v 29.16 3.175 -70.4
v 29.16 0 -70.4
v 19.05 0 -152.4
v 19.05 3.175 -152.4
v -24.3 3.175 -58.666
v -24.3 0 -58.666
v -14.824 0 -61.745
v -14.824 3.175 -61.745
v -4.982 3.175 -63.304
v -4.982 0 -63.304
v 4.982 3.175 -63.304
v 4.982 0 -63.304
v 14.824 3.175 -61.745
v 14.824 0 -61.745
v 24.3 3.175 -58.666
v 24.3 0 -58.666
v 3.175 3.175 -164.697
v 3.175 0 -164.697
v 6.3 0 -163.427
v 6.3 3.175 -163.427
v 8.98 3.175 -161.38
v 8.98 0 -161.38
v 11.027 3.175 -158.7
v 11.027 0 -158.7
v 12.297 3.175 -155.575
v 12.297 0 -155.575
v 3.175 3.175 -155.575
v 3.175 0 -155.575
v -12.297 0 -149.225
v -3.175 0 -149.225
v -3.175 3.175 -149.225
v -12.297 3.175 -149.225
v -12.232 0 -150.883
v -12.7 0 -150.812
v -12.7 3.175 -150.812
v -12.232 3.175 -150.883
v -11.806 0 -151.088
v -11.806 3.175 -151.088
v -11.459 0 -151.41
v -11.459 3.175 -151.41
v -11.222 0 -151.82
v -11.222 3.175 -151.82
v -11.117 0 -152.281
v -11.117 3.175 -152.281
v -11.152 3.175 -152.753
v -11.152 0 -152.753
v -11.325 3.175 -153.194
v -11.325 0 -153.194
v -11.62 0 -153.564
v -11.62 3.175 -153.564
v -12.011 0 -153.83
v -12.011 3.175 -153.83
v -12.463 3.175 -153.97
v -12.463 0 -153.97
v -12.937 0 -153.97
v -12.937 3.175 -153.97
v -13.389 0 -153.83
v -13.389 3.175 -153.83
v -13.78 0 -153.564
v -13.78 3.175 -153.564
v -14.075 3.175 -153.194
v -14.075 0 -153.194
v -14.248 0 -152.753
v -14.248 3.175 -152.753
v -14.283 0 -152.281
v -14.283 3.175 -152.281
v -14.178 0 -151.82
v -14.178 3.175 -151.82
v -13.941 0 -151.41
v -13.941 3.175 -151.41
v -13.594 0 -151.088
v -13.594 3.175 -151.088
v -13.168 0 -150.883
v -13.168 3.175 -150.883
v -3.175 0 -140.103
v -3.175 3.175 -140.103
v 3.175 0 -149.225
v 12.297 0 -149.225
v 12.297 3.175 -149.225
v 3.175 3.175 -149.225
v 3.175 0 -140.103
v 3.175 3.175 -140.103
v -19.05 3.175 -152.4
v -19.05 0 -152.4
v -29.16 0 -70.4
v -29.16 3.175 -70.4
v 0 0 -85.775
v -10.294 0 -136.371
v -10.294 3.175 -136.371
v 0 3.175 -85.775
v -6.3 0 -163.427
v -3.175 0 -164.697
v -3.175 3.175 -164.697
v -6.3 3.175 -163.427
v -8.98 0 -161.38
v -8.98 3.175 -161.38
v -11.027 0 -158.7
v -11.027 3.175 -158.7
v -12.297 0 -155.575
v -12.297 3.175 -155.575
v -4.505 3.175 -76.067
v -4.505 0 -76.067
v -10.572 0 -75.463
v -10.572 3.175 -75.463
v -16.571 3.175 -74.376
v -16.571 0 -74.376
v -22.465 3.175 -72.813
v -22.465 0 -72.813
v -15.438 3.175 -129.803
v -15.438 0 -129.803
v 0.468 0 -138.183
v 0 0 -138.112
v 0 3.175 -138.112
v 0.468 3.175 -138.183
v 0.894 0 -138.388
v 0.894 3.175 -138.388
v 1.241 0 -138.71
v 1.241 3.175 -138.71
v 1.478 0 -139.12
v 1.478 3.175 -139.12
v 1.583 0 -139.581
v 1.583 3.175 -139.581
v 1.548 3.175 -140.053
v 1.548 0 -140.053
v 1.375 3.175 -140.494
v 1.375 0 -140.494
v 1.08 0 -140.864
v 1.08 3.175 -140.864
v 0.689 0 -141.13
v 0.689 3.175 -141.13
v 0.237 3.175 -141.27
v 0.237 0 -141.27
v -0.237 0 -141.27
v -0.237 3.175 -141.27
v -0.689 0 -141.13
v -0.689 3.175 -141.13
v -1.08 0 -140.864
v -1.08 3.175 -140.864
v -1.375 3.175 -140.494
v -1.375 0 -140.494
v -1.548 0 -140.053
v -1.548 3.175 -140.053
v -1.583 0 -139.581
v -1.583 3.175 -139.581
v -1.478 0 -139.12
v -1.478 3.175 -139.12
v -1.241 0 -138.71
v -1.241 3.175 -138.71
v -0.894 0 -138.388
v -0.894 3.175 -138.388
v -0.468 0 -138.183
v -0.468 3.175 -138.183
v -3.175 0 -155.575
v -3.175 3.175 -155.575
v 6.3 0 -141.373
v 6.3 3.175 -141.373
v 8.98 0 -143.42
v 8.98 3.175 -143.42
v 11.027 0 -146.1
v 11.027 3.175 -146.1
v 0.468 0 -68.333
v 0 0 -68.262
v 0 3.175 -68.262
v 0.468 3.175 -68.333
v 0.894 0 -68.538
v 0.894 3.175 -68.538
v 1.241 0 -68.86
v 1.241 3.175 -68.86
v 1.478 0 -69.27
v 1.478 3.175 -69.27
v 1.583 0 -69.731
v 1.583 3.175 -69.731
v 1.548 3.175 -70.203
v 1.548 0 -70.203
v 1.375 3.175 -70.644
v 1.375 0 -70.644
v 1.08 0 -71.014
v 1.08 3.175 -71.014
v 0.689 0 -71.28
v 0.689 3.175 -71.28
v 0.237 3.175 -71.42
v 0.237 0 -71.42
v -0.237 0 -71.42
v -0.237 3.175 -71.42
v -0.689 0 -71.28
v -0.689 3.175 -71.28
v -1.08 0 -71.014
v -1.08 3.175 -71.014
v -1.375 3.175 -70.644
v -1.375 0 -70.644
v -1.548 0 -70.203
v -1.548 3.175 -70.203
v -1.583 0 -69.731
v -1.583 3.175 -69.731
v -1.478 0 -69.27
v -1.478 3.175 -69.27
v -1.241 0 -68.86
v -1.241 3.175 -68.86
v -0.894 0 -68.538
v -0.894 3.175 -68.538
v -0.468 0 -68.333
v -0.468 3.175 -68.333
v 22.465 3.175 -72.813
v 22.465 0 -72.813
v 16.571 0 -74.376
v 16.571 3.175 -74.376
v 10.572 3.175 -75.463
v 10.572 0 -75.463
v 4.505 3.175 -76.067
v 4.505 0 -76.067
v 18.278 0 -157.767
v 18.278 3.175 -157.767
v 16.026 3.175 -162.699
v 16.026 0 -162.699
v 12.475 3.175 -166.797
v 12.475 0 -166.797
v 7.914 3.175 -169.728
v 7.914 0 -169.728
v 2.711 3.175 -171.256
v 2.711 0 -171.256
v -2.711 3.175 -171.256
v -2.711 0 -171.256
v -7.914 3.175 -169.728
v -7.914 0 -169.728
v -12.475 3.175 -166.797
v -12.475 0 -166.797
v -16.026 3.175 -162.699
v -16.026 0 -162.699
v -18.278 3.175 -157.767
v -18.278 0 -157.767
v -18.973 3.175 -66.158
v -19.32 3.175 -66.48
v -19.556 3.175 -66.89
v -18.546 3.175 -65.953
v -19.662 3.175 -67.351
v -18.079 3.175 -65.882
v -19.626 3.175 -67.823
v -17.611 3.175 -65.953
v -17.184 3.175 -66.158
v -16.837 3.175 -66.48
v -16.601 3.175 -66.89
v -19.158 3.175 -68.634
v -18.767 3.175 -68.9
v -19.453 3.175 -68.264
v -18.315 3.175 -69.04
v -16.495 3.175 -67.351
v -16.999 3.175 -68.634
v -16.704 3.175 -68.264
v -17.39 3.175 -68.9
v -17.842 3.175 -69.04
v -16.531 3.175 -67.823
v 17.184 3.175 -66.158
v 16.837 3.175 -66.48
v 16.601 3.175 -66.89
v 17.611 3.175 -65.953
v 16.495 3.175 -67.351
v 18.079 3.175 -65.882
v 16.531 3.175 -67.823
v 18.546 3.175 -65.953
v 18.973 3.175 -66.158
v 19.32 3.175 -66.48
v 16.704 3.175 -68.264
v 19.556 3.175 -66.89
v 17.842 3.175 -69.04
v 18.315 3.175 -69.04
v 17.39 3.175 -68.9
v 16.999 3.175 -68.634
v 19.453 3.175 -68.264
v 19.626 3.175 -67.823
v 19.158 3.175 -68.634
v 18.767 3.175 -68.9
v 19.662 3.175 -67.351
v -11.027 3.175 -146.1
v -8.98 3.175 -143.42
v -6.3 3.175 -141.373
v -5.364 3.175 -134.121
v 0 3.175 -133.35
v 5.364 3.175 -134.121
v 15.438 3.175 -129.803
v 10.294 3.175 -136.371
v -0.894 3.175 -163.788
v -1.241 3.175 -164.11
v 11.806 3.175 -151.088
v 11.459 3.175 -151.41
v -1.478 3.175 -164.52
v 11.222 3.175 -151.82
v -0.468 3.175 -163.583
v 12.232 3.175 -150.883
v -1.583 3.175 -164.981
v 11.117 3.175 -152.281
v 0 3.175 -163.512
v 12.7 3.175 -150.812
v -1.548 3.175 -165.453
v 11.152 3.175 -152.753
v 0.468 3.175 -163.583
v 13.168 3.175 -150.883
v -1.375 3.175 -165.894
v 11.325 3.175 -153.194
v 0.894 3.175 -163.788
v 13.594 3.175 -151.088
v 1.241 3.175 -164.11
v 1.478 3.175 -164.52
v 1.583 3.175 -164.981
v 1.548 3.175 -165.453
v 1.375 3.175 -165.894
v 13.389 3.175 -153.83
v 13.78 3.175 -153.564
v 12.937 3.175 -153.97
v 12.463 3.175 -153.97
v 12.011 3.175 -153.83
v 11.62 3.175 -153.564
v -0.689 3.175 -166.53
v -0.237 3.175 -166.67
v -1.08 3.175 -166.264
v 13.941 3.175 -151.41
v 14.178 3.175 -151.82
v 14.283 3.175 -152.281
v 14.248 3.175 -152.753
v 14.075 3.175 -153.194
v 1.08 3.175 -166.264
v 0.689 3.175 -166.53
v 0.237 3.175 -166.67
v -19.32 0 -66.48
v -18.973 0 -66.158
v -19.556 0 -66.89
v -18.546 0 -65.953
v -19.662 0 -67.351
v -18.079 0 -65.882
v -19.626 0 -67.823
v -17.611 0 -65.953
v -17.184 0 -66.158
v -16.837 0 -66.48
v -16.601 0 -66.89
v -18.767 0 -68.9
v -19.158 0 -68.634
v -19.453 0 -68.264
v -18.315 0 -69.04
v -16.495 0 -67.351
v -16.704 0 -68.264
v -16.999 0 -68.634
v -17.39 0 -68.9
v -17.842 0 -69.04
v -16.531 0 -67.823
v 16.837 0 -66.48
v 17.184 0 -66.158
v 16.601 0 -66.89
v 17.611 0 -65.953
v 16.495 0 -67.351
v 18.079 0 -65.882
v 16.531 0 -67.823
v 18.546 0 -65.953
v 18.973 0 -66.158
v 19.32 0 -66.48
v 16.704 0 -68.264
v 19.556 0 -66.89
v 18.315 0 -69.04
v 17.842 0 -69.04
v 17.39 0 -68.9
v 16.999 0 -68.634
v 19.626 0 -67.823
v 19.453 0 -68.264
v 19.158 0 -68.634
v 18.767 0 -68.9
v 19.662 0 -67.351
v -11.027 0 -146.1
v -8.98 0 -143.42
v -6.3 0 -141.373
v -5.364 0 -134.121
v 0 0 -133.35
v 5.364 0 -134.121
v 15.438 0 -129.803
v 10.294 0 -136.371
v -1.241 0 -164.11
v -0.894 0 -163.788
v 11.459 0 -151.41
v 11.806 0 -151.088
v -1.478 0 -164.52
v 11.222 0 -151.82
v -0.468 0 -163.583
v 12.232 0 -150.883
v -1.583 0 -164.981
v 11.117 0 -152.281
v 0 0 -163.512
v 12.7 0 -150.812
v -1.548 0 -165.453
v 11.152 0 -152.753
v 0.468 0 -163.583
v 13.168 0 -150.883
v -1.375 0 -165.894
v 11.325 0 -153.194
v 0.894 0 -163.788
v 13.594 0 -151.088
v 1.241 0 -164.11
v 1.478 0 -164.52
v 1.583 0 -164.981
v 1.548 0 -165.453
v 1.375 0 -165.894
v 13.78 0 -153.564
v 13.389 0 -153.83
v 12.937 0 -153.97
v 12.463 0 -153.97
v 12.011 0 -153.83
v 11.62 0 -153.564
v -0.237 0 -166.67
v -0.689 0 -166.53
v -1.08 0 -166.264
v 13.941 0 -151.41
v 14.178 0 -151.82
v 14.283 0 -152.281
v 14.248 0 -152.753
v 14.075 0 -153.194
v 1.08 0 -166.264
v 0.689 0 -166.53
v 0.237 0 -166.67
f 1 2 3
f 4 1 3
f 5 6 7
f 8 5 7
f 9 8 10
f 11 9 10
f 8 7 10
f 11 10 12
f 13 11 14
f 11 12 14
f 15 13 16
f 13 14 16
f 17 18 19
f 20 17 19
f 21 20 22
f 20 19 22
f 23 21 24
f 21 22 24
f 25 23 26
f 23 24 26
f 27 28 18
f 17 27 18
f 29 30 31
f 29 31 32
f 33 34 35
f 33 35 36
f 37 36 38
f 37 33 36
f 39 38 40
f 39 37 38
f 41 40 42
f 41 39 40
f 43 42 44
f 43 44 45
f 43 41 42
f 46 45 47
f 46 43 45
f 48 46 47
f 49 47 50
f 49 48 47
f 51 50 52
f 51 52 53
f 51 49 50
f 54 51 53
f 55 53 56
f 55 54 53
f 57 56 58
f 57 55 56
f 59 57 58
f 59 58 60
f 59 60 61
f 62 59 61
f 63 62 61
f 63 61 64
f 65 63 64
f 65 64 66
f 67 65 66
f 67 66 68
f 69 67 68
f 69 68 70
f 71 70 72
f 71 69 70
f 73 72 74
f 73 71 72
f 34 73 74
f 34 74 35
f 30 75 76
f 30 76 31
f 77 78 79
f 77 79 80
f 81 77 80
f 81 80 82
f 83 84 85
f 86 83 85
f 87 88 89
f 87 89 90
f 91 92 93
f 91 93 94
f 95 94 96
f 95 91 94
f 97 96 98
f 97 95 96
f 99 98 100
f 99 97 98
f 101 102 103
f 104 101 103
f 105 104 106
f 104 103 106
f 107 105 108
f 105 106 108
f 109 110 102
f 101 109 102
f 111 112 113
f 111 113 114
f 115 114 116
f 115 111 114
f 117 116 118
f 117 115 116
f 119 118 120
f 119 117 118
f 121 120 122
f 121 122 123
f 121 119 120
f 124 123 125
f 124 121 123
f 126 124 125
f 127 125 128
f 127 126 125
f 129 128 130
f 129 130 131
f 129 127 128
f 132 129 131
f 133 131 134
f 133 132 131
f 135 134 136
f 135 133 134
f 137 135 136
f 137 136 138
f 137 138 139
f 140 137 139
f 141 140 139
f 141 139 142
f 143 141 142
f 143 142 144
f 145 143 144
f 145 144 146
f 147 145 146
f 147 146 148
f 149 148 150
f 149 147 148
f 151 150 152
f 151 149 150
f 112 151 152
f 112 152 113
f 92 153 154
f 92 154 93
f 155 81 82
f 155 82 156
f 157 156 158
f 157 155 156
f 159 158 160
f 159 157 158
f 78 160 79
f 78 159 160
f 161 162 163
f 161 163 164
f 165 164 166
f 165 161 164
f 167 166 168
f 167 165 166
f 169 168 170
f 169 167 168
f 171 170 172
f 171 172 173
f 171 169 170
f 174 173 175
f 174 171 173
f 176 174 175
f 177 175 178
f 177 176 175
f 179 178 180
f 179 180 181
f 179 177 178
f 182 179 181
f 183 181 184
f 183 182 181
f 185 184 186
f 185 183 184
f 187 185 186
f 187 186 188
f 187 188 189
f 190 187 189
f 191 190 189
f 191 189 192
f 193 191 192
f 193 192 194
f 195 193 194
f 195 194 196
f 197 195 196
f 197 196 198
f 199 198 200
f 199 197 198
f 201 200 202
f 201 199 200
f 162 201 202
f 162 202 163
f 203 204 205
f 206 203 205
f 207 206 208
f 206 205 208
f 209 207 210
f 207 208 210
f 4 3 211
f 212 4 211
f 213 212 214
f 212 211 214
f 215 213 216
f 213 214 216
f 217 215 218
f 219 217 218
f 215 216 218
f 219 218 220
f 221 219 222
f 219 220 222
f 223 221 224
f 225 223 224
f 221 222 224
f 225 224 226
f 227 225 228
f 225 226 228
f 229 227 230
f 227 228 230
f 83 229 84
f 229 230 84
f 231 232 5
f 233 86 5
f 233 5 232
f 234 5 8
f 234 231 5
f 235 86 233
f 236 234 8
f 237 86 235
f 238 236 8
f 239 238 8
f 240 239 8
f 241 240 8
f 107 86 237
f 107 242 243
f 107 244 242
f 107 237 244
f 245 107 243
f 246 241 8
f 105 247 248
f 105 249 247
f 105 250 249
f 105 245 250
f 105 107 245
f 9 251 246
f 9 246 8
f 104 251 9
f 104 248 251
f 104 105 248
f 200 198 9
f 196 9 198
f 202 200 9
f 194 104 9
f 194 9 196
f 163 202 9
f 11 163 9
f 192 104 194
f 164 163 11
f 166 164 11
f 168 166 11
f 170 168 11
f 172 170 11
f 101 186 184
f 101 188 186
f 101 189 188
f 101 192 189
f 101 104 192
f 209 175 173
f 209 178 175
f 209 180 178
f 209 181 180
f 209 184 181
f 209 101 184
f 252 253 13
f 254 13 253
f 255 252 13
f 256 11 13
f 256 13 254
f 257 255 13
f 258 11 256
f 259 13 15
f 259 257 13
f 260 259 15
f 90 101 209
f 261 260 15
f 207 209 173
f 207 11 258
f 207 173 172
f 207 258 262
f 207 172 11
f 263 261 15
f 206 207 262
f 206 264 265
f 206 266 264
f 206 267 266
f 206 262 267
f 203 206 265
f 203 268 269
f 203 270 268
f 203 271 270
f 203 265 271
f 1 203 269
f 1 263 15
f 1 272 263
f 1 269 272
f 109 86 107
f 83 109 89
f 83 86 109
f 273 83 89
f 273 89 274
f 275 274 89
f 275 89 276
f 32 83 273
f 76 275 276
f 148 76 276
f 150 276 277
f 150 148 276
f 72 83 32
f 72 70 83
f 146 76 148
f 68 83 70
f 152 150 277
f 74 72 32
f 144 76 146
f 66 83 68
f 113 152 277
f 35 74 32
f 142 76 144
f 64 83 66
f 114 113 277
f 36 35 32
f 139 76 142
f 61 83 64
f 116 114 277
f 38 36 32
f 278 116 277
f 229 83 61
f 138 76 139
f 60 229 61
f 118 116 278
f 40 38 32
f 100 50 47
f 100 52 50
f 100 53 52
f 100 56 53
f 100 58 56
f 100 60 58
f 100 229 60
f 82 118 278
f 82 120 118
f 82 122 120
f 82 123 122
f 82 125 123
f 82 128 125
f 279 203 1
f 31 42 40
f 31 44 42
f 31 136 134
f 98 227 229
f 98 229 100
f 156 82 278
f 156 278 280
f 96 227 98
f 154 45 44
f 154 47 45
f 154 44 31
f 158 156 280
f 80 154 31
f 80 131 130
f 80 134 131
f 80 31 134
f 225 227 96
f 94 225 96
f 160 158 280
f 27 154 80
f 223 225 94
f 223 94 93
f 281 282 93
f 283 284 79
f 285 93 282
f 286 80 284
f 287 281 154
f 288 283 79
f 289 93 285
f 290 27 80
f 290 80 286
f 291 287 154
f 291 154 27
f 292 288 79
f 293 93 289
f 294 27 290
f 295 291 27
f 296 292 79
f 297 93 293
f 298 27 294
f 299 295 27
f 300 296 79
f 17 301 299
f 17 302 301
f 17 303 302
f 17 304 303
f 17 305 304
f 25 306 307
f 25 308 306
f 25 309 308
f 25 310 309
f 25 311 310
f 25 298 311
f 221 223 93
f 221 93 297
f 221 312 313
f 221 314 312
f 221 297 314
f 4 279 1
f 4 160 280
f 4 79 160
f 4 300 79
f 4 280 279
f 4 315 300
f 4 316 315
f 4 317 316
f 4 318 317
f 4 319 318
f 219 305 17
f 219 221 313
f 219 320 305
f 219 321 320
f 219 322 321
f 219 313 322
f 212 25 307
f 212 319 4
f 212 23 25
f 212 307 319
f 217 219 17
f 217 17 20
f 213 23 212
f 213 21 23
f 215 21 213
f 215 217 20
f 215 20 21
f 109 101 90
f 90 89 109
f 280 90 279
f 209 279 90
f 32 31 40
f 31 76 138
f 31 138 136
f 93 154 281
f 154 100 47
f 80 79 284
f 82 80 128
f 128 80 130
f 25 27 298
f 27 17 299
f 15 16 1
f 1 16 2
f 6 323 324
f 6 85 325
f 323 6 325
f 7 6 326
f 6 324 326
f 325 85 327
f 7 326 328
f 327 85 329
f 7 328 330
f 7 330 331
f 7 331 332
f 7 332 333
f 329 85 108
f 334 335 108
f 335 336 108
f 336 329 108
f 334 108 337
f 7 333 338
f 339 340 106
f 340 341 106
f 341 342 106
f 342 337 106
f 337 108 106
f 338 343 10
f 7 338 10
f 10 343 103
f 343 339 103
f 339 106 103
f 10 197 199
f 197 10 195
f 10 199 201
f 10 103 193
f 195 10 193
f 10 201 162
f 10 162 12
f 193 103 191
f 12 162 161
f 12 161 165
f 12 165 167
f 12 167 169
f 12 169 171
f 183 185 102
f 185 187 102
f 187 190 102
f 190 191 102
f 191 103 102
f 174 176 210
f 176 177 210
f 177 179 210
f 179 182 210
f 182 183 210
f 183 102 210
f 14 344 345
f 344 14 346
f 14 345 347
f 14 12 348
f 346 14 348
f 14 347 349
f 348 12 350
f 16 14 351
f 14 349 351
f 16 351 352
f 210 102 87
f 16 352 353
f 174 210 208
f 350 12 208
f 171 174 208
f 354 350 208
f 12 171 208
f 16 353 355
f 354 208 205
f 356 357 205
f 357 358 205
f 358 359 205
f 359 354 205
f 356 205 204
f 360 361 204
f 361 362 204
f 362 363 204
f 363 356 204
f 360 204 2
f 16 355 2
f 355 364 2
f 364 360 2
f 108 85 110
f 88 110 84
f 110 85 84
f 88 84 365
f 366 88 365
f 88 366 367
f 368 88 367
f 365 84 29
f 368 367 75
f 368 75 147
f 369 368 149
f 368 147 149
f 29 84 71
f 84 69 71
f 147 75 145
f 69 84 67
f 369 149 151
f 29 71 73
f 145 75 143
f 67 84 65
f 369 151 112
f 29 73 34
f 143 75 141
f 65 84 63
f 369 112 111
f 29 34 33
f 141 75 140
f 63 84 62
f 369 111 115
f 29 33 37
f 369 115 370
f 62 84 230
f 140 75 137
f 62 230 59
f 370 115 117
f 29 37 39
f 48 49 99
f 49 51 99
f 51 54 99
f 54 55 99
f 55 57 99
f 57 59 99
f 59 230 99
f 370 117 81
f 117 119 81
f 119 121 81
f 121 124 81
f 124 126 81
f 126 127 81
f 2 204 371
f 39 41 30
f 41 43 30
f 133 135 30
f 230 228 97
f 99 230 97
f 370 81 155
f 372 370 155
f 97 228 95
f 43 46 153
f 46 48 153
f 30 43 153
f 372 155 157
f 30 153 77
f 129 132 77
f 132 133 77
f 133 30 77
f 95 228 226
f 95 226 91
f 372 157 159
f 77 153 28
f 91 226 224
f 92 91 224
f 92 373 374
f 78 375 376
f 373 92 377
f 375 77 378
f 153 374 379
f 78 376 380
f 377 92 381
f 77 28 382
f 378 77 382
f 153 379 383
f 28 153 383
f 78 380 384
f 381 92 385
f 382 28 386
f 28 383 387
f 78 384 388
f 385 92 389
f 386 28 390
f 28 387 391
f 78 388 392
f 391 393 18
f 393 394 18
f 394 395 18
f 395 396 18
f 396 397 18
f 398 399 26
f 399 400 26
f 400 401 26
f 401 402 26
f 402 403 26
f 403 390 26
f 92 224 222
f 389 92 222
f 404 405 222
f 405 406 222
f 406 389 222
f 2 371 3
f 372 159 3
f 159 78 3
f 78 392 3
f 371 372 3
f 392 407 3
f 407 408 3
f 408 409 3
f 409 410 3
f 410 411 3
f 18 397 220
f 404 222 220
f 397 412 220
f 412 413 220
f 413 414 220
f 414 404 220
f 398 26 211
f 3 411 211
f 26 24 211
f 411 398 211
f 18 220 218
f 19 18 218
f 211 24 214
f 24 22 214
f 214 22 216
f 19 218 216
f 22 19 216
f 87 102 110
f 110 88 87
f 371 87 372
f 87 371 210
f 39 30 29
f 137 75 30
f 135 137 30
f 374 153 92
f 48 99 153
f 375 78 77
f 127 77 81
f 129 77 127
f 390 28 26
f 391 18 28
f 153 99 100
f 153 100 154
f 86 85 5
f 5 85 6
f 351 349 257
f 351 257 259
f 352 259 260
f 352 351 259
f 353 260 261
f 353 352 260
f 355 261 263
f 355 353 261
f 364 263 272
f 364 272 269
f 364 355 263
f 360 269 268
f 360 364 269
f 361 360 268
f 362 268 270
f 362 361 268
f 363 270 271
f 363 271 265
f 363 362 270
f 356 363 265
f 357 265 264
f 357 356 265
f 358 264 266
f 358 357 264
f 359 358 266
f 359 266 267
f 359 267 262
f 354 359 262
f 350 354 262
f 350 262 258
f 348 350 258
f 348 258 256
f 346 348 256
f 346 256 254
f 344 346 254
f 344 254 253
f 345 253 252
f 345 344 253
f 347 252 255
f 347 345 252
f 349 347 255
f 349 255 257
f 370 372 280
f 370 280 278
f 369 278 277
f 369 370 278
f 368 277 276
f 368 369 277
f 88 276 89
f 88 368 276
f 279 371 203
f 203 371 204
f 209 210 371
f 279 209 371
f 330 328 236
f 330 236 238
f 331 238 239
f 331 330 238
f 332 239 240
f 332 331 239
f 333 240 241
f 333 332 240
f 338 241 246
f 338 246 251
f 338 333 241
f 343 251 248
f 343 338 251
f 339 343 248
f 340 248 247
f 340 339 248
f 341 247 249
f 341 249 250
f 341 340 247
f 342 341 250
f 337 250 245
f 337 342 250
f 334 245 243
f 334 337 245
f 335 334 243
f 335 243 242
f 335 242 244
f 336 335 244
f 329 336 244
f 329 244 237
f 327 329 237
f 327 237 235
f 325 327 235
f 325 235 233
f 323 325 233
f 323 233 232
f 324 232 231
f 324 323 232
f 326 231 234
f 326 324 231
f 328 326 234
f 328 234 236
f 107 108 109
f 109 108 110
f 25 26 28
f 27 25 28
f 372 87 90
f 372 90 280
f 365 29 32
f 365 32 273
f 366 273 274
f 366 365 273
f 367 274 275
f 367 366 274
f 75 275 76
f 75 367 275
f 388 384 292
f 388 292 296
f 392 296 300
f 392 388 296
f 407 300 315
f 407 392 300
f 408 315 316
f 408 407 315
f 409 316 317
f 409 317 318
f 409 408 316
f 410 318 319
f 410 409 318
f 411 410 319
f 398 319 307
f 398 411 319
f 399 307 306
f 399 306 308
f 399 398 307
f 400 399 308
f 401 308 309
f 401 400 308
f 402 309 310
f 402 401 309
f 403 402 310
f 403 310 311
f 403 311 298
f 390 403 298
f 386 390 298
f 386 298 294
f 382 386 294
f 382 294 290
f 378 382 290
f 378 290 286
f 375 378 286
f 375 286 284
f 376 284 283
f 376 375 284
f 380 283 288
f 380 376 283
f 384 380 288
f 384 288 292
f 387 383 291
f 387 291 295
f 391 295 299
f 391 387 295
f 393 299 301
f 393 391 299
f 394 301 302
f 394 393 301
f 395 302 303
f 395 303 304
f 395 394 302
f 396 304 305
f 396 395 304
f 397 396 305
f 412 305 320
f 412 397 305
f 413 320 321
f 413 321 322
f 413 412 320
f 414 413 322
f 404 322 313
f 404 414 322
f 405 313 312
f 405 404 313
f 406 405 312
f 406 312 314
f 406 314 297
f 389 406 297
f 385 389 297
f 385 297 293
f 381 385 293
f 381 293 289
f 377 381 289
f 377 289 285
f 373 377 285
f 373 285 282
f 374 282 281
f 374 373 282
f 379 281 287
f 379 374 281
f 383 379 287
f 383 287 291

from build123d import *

# Parameters (mm, degrees)
SKETCH1_R           = 1.5875
SKETCH1_R_2         = 1.587499999
BOSS_EXTRUDE1_DEPTH = 3.175


with BuildPart() as part:
    # Sketch1 → Boss-Extrude1 (new body)
    with BuildSketch(Plane(origin=(0, 0, 0), x_dir=(1, 0, 0), z_dir=(0, 1, 0))):
        with BuildLine():
            Line((-19.05, 152.4), (-29.160477546, 70.399620377))
            Line((-29.160477546, 70.399620377), (-24.300397955, 58.666350314))
            ThreePointArc((-24.300397955, 58.666350314), (0, 63.5), (24.300397955, 58.666350314))
            Line((24.300397955, 58.666350314), (29.160477546, 70.399620377))
            Line((29.160477546, 70.399620377), (19.05, 152.4))
            ThreePointArc((19.05, 152.4), (0, 171.45), (-19.05, 152.4))
        make_face()
        with Locations(Location((0, 139.7, 0), (0, 0, 270))):
            Circle(SKETCH1_R, mode=Mode.SUBTRACT)
        with Locations(Location((-12.7, 152.4, 0), (0, 0, 270))):
            Circle(SKETCH1_R, mode=Mode.SUBTRACT)
        with Locations(Location((0, 69.85, 0), (0, 0, 270))):
            Circle(SKETCH1_R, mode=Mode.SUBTRACT)
        with Locations(Location((18.0785103, 67.469918962, 0), (0, 0, 270))):
            Circle(SKETCH1_R, mode=Mode.SUBTRACT)
        with Locations(Location((0, 165.1, 0), (0, 0, 270))):
            Circle(SKETCH1_R, mode=Mode.SUBTRACT)
        with Locations(Location((12.7, 152.4, 0), (0, 0, 270))):
            Circle(SKETCH1_R, mode=Mode.SUBTRACT)
        with Locations(Location((-18.078510302, 67.469918971, 0), (0, 0, 270))):
            Circle(SKETCH1_R_2, mode=Mode.SUBTRACT)
        with BuildLine():
            Line((-15.438109232, 129.802746381), (-4.504911756, 76.066719201))
            ThreePointArc((-4.504911756, 76.066719201), (-13.582616579, 74.97968076), (-22.464793382, 72.813275289))
            Line((-22.464793382, 72.813275289), (-15.438109232, 129.802746381))
        make_face(mode=Mode.SUBTRACT)
        with BuildLine():
            Line((-10.294399454, 136.371031229), (0, 85.774659025))
            Line((0, 85.774659025), (10.294399454, 136.371031229))
            ThreePointArc((10.294399454, 136.371031229), (0, 133.35), (-10.294399454, 136.371031229))
        make_face(mode=Mode.SUBTRACT)
        with BuildLine():
            Line((12.296722124, 155.575), (3.175, 155.575))
            Line((3.175, 155.575), (3.175, 164.696722124))
            ThreePointArc((3.175, 164.696722124), (8.980256121, 161.380256121), (12.296722124, 155.575))
        make_face(mode=Mode.SUBTRACT)
        with BuildLine():
            Line((-3.175, 149.225), (-12.296722124, 149.225))
            ThreePointArc((-12.296722124, 149.225), (-8.980256121, 143.419743879), (-3.175, 140.103277876))
            Line((-3.175, 140.103277876), (-3.175, 149.225))
        make_face(mode=Mode.SUBTRACT)
        with BuildLine():
            Line((12.296722124, 149.225), (3.175, 149.225))
            Line((3.175, 149.225), (3.175, 140.103277876))
            ThreePointArc((3.175, 140.103277876), (8.980256121, 143.419743879), (12.296722124, 149.225))
        make_face(mode=Mode.SUBTRACT)
        with BuildLine():
            Line((4.504911756, 76.066719201), (15.438109232, 129.802746381))
            Line((15.438109232, 129.802746381), (22.464793382, 72.813275289))
            ThreePointArc((22.464793382, 72.813275289), (13.582616579, 74.97968076), (4.504911756, 76.066719201))
        make_face(mode=Mode.SUBTRACT)
        with BuildLine():
            Line((-3.175, 155.575), (-3.175, 164.696722124))
            ThreePointArc((-3.175, 164.696722124), (-8.980256121, 161.380256121), (-12.296722124, 155.575))
            Line((-12.296722124, 155.575), (-3.175, 155.575))
        make_face(mode=Mode.SUBTRACT)
    extrude(amount=BOSS_EXTRUDE1_DEPTH)


solid = part.part
